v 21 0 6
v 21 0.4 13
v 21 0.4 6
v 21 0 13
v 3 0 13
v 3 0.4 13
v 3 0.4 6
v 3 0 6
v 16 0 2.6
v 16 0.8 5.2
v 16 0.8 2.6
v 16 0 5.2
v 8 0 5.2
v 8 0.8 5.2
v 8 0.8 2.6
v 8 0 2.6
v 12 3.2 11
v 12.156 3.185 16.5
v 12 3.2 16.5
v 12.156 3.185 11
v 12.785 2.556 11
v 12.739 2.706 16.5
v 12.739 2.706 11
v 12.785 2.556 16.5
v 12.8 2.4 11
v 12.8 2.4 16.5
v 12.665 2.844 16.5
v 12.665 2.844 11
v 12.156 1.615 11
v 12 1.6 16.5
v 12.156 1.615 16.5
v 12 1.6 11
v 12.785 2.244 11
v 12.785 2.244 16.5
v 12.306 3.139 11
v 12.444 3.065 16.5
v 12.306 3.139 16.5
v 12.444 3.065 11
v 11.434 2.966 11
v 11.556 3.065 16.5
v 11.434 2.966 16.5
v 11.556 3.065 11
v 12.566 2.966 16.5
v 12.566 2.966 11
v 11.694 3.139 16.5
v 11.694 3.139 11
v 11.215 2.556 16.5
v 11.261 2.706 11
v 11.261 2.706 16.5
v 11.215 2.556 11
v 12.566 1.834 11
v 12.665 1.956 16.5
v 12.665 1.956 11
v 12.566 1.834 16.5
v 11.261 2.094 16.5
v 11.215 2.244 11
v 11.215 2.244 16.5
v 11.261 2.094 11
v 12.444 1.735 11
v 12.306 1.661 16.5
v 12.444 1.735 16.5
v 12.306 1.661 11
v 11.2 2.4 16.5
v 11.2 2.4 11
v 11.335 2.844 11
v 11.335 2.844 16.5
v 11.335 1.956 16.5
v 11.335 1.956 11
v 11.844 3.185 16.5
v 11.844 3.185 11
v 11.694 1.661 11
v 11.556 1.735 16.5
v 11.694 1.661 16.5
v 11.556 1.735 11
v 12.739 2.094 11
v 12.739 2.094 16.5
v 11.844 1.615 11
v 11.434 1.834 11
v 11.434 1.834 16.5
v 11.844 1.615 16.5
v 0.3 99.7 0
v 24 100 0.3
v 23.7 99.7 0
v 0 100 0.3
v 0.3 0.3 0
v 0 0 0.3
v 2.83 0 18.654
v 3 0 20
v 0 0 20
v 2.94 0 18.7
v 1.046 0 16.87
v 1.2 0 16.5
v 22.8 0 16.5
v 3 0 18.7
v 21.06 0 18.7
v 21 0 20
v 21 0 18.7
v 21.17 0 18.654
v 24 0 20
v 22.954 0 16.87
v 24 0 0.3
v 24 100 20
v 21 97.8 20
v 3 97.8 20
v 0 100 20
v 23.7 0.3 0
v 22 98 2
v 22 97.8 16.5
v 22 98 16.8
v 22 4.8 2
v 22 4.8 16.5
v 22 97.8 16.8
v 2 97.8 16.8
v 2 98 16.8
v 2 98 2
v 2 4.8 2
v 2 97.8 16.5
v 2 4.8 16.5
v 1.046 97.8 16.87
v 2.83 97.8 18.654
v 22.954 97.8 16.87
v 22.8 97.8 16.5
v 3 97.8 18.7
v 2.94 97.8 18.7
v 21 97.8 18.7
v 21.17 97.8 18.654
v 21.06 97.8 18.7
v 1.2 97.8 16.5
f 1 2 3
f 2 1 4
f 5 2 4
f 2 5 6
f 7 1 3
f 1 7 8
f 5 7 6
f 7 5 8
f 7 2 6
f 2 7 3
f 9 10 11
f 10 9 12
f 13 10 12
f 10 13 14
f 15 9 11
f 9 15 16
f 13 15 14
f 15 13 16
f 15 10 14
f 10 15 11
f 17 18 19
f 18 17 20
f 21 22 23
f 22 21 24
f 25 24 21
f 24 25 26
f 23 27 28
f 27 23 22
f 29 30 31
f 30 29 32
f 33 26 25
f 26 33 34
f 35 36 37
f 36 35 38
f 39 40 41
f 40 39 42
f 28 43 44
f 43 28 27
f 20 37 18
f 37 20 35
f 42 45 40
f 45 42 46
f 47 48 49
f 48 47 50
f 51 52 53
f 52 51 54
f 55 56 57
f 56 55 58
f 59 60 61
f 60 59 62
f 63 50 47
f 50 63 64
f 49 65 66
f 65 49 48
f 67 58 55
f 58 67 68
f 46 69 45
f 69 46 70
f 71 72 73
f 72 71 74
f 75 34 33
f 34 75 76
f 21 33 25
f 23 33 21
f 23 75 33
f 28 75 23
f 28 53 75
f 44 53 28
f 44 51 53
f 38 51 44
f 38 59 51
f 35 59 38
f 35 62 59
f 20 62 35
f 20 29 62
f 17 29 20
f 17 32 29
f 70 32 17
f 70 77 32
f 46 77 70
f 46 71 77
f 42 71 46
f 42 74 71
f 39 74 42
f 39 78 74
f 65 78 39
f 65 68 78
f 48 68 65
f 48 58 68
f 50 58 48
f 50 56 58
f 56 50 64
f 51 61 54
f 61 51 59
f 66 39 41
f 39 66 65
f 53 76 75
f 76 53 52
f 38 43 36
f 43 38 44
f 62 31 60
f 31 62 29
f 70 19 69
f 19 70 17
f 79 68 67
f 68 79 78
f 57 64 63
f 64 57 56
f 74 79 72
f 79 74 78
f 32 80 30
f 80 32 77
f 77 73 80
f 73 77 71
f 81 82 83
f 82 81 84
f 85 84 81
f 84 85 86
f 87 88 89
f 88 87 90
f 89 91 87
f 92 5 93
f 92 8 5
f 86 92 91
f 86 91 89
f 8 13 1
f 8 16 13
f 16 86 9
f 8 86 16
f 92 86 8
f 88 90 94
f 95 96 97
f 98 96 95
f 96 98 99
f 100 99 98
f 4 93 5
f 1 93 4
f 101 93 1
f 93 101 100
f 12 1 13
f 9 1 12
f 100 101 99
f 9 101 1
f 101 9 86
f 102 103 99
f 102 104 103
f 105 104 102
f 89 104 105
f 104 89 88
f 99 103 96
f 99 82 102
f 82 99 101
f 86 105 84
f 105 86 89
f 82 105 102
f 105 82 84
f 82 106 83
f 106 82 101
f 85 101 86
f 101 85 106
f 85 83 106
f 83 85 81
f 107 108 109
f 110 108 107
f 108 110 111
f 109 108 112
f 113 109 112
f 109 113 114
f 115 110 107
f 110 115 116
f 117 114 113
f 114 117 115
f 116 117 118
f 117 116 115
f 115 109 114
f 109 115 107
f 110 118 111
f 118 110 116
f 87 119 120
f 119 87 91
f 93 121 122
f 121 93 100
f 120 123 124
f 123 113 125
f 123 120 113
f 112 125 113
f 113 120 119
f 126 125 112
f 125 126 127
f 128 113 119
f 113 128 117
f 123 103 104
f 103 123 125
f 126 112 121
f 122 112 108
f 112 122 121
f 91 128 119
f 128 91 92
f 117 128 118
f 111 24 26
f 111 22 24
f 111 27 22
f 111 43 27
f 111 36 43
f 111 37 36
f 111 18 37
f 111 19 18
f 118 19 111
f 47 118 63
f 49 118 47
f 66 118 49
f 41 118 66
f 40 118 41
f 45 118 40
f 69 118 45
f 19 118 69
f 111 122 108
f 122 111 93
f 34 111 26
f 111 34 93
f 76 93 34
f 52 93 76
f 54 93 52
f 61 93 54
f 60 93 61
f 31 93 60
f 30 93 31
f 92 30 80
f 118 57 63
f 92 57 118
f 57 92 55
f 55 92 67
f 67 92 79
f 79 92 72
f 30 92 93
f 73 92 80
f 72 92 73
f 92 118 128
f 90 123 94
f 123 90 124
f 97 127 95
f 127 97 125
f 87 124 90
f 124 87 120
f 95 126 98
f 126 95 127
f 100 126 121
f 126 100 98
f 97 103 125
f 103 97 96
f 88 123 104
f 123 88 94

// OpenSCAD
// Quantyra electronics component storage. Original geometry, millimetres.
// Copyright Daniel Eric Fredriksen / Quantyra. CERN-OHL-S-2.0.
// Source Location: https://github.com/Quantyra/electronics-component-storage
part = "body"; // body, lid, rack, assembly, exploded, rack_use, keeper
span_x = 1;
span_z = 1;
clearance = 0.30; // NORMAL offset of each mating rail face, not diametral
cols = 6;
rows = 6;
bay_x = 1;
bay_z = 1;
pitch_x = 26;
pitch_z = 22;
case_length = 100;
wall = 2;
floor_t = 2;
front_t = 4.8; // room for M2 pilot plus label recess without a thin wall
rail_wall = 1.2;
eps = 0.01;
$fn = 32;
function width(n) = pitch_x*n-2;
function height(n) = pitch_z*n-2;
function rack_w() = 4 + cols*pitch_x-rail_wall;
function rack_h() = 4 + rows*pitch_z-rail_wall;
function rack_depth() = case_length+2.4;
assert(span_x>=1 && span_z>=1 && clearance>=0.15 && clearance<=0.45);
assert(wall==2 && floor_t>=2 && case_length>=30,
       "Rail design requires 2 mm side walls; change profile too when changing wall.");
module prism_y(length) {
    translate([0,length,0]) rotate([90,0,0]) linear_extrude(length) children();
}
module rail_section(w) {
    polygon([[1.4,0],[w-1.4,0],[w-3,1.6],[3,1.6]]);
}
module relieved_block(w,l,h) {
    // 0.3 x 0.3 first-layer relief on every exterior floor edge.
    hull() {
        translate([0.3,0.3,0]) cube([w-0.6,l-0.6,0.01]);
        translate([0,0,0.3]) cube([w,l,h-0.3]);
    }
}
module body(nx=span_x,nz=span_z,c=clearance,l=case_length,details=true) {
    w=width(nx); h=height(nz);
    difference() {
        relieved_block(w,l,h);
        // Smooth cavity: no internal dividers, slots or keeper protrusions.
        translate([wall,front_t,floor_t]) cube([w-2*wall,l-front_t-wall,h-5.2]);
        translate([0,-eps,h-3.2]) prism_y(l-2.2+eps)
            offset(delta=c, chamfer=true) rail_section(w);
        translate([3,-eps,h-1.6]) cube([w-6,l-2.2+eps,3]);
        if(details) {
            // Replaceable label pocket; grip below it, independent of lid.
            translate([3,-eps,6]) cube([w-6,0.41,7]);
            translate([w/2-4,-eps,2.6]) cube([8,0.81,2.6]);
            // M2 removable keeper pilot, only in the front wall.
            translate([w/2,front_t/2,h-9]) cylinder(h=10,d=1.6);
        }
    }
}
module lid(nx=span_x,l=case_length,details=true) {
    w=width(nx);
    difference() {
        prism_y(l-2.6) rail_section(w);
        if(details) {
            translate([w/2,front_t/2,-eps]) cylinder(h=2,d=2.4);
            // Recessed fingertip drag pocket: no handle above or outside case.
            translate([w/2-5,7,1.1]) cube([10,8,1]);
        }
    }
}
module keeper(nx=span_x,nz=span_z) {
    // Reference envelope only: externally sourced M2x6, head <=4 x 1.4.
    translate([width(nx)/2,front_t/2,height(nz)-1.6]) {
        cylinder(h=1.4,d=4);
        translate([0,0,-6]) cylinder(h=6,d=2);
    }
}
module closed_case(nx=span_x,nz=span_z,explode=0) {
    color("#d2b56d") body(nx,nz);
    color("#447e99") translate([0,-explode,height(nz)-3.2+explode]) lid(nx);
    color("#60666a") translate([0,0,explode*2]) keeper(nx,nz);
}
module rack_use() {
    assert(cols%bay_x==0 && rows%bay_z==0);
    difference() {
        cube([rack_w(),rack_depth(),rack_h()]);
        for(i=[0:cols/bay_x-1], j=[0:rows/bay_z-1])
            translate([2+i*bay_x*pitch_x,-eps,2+j*bay_z*pitch_z])
                cube([bay_x*pitch_x-rail_wall,case_length+0.4+eps,
                      bay_z*pitch_z-rail_wall]);
    }
}
module rack_print() {
    // Back on bed, openings up. Use axes X / depth Y / height Z.
    // (X,Y,Z) use -> (X,Z,depth-Y) print: back is Z=0..2, bays above.
    translate([0,0,rack_depth()]) rotate([-90,0,0]) rack_use();
}
if(part=="body") body();
else if(part=="lid") lid();
else if(part=="rack") rack_print();
else if(part=="assembly") closed_case();
else if(part=="exploded") closed_case(explode=18);
else if(part=="rack_use") rack_use(); // validation export
else if(part=="keeper") keeper(); // validation envelope, do not print
else assert(false,"Unknown part");
